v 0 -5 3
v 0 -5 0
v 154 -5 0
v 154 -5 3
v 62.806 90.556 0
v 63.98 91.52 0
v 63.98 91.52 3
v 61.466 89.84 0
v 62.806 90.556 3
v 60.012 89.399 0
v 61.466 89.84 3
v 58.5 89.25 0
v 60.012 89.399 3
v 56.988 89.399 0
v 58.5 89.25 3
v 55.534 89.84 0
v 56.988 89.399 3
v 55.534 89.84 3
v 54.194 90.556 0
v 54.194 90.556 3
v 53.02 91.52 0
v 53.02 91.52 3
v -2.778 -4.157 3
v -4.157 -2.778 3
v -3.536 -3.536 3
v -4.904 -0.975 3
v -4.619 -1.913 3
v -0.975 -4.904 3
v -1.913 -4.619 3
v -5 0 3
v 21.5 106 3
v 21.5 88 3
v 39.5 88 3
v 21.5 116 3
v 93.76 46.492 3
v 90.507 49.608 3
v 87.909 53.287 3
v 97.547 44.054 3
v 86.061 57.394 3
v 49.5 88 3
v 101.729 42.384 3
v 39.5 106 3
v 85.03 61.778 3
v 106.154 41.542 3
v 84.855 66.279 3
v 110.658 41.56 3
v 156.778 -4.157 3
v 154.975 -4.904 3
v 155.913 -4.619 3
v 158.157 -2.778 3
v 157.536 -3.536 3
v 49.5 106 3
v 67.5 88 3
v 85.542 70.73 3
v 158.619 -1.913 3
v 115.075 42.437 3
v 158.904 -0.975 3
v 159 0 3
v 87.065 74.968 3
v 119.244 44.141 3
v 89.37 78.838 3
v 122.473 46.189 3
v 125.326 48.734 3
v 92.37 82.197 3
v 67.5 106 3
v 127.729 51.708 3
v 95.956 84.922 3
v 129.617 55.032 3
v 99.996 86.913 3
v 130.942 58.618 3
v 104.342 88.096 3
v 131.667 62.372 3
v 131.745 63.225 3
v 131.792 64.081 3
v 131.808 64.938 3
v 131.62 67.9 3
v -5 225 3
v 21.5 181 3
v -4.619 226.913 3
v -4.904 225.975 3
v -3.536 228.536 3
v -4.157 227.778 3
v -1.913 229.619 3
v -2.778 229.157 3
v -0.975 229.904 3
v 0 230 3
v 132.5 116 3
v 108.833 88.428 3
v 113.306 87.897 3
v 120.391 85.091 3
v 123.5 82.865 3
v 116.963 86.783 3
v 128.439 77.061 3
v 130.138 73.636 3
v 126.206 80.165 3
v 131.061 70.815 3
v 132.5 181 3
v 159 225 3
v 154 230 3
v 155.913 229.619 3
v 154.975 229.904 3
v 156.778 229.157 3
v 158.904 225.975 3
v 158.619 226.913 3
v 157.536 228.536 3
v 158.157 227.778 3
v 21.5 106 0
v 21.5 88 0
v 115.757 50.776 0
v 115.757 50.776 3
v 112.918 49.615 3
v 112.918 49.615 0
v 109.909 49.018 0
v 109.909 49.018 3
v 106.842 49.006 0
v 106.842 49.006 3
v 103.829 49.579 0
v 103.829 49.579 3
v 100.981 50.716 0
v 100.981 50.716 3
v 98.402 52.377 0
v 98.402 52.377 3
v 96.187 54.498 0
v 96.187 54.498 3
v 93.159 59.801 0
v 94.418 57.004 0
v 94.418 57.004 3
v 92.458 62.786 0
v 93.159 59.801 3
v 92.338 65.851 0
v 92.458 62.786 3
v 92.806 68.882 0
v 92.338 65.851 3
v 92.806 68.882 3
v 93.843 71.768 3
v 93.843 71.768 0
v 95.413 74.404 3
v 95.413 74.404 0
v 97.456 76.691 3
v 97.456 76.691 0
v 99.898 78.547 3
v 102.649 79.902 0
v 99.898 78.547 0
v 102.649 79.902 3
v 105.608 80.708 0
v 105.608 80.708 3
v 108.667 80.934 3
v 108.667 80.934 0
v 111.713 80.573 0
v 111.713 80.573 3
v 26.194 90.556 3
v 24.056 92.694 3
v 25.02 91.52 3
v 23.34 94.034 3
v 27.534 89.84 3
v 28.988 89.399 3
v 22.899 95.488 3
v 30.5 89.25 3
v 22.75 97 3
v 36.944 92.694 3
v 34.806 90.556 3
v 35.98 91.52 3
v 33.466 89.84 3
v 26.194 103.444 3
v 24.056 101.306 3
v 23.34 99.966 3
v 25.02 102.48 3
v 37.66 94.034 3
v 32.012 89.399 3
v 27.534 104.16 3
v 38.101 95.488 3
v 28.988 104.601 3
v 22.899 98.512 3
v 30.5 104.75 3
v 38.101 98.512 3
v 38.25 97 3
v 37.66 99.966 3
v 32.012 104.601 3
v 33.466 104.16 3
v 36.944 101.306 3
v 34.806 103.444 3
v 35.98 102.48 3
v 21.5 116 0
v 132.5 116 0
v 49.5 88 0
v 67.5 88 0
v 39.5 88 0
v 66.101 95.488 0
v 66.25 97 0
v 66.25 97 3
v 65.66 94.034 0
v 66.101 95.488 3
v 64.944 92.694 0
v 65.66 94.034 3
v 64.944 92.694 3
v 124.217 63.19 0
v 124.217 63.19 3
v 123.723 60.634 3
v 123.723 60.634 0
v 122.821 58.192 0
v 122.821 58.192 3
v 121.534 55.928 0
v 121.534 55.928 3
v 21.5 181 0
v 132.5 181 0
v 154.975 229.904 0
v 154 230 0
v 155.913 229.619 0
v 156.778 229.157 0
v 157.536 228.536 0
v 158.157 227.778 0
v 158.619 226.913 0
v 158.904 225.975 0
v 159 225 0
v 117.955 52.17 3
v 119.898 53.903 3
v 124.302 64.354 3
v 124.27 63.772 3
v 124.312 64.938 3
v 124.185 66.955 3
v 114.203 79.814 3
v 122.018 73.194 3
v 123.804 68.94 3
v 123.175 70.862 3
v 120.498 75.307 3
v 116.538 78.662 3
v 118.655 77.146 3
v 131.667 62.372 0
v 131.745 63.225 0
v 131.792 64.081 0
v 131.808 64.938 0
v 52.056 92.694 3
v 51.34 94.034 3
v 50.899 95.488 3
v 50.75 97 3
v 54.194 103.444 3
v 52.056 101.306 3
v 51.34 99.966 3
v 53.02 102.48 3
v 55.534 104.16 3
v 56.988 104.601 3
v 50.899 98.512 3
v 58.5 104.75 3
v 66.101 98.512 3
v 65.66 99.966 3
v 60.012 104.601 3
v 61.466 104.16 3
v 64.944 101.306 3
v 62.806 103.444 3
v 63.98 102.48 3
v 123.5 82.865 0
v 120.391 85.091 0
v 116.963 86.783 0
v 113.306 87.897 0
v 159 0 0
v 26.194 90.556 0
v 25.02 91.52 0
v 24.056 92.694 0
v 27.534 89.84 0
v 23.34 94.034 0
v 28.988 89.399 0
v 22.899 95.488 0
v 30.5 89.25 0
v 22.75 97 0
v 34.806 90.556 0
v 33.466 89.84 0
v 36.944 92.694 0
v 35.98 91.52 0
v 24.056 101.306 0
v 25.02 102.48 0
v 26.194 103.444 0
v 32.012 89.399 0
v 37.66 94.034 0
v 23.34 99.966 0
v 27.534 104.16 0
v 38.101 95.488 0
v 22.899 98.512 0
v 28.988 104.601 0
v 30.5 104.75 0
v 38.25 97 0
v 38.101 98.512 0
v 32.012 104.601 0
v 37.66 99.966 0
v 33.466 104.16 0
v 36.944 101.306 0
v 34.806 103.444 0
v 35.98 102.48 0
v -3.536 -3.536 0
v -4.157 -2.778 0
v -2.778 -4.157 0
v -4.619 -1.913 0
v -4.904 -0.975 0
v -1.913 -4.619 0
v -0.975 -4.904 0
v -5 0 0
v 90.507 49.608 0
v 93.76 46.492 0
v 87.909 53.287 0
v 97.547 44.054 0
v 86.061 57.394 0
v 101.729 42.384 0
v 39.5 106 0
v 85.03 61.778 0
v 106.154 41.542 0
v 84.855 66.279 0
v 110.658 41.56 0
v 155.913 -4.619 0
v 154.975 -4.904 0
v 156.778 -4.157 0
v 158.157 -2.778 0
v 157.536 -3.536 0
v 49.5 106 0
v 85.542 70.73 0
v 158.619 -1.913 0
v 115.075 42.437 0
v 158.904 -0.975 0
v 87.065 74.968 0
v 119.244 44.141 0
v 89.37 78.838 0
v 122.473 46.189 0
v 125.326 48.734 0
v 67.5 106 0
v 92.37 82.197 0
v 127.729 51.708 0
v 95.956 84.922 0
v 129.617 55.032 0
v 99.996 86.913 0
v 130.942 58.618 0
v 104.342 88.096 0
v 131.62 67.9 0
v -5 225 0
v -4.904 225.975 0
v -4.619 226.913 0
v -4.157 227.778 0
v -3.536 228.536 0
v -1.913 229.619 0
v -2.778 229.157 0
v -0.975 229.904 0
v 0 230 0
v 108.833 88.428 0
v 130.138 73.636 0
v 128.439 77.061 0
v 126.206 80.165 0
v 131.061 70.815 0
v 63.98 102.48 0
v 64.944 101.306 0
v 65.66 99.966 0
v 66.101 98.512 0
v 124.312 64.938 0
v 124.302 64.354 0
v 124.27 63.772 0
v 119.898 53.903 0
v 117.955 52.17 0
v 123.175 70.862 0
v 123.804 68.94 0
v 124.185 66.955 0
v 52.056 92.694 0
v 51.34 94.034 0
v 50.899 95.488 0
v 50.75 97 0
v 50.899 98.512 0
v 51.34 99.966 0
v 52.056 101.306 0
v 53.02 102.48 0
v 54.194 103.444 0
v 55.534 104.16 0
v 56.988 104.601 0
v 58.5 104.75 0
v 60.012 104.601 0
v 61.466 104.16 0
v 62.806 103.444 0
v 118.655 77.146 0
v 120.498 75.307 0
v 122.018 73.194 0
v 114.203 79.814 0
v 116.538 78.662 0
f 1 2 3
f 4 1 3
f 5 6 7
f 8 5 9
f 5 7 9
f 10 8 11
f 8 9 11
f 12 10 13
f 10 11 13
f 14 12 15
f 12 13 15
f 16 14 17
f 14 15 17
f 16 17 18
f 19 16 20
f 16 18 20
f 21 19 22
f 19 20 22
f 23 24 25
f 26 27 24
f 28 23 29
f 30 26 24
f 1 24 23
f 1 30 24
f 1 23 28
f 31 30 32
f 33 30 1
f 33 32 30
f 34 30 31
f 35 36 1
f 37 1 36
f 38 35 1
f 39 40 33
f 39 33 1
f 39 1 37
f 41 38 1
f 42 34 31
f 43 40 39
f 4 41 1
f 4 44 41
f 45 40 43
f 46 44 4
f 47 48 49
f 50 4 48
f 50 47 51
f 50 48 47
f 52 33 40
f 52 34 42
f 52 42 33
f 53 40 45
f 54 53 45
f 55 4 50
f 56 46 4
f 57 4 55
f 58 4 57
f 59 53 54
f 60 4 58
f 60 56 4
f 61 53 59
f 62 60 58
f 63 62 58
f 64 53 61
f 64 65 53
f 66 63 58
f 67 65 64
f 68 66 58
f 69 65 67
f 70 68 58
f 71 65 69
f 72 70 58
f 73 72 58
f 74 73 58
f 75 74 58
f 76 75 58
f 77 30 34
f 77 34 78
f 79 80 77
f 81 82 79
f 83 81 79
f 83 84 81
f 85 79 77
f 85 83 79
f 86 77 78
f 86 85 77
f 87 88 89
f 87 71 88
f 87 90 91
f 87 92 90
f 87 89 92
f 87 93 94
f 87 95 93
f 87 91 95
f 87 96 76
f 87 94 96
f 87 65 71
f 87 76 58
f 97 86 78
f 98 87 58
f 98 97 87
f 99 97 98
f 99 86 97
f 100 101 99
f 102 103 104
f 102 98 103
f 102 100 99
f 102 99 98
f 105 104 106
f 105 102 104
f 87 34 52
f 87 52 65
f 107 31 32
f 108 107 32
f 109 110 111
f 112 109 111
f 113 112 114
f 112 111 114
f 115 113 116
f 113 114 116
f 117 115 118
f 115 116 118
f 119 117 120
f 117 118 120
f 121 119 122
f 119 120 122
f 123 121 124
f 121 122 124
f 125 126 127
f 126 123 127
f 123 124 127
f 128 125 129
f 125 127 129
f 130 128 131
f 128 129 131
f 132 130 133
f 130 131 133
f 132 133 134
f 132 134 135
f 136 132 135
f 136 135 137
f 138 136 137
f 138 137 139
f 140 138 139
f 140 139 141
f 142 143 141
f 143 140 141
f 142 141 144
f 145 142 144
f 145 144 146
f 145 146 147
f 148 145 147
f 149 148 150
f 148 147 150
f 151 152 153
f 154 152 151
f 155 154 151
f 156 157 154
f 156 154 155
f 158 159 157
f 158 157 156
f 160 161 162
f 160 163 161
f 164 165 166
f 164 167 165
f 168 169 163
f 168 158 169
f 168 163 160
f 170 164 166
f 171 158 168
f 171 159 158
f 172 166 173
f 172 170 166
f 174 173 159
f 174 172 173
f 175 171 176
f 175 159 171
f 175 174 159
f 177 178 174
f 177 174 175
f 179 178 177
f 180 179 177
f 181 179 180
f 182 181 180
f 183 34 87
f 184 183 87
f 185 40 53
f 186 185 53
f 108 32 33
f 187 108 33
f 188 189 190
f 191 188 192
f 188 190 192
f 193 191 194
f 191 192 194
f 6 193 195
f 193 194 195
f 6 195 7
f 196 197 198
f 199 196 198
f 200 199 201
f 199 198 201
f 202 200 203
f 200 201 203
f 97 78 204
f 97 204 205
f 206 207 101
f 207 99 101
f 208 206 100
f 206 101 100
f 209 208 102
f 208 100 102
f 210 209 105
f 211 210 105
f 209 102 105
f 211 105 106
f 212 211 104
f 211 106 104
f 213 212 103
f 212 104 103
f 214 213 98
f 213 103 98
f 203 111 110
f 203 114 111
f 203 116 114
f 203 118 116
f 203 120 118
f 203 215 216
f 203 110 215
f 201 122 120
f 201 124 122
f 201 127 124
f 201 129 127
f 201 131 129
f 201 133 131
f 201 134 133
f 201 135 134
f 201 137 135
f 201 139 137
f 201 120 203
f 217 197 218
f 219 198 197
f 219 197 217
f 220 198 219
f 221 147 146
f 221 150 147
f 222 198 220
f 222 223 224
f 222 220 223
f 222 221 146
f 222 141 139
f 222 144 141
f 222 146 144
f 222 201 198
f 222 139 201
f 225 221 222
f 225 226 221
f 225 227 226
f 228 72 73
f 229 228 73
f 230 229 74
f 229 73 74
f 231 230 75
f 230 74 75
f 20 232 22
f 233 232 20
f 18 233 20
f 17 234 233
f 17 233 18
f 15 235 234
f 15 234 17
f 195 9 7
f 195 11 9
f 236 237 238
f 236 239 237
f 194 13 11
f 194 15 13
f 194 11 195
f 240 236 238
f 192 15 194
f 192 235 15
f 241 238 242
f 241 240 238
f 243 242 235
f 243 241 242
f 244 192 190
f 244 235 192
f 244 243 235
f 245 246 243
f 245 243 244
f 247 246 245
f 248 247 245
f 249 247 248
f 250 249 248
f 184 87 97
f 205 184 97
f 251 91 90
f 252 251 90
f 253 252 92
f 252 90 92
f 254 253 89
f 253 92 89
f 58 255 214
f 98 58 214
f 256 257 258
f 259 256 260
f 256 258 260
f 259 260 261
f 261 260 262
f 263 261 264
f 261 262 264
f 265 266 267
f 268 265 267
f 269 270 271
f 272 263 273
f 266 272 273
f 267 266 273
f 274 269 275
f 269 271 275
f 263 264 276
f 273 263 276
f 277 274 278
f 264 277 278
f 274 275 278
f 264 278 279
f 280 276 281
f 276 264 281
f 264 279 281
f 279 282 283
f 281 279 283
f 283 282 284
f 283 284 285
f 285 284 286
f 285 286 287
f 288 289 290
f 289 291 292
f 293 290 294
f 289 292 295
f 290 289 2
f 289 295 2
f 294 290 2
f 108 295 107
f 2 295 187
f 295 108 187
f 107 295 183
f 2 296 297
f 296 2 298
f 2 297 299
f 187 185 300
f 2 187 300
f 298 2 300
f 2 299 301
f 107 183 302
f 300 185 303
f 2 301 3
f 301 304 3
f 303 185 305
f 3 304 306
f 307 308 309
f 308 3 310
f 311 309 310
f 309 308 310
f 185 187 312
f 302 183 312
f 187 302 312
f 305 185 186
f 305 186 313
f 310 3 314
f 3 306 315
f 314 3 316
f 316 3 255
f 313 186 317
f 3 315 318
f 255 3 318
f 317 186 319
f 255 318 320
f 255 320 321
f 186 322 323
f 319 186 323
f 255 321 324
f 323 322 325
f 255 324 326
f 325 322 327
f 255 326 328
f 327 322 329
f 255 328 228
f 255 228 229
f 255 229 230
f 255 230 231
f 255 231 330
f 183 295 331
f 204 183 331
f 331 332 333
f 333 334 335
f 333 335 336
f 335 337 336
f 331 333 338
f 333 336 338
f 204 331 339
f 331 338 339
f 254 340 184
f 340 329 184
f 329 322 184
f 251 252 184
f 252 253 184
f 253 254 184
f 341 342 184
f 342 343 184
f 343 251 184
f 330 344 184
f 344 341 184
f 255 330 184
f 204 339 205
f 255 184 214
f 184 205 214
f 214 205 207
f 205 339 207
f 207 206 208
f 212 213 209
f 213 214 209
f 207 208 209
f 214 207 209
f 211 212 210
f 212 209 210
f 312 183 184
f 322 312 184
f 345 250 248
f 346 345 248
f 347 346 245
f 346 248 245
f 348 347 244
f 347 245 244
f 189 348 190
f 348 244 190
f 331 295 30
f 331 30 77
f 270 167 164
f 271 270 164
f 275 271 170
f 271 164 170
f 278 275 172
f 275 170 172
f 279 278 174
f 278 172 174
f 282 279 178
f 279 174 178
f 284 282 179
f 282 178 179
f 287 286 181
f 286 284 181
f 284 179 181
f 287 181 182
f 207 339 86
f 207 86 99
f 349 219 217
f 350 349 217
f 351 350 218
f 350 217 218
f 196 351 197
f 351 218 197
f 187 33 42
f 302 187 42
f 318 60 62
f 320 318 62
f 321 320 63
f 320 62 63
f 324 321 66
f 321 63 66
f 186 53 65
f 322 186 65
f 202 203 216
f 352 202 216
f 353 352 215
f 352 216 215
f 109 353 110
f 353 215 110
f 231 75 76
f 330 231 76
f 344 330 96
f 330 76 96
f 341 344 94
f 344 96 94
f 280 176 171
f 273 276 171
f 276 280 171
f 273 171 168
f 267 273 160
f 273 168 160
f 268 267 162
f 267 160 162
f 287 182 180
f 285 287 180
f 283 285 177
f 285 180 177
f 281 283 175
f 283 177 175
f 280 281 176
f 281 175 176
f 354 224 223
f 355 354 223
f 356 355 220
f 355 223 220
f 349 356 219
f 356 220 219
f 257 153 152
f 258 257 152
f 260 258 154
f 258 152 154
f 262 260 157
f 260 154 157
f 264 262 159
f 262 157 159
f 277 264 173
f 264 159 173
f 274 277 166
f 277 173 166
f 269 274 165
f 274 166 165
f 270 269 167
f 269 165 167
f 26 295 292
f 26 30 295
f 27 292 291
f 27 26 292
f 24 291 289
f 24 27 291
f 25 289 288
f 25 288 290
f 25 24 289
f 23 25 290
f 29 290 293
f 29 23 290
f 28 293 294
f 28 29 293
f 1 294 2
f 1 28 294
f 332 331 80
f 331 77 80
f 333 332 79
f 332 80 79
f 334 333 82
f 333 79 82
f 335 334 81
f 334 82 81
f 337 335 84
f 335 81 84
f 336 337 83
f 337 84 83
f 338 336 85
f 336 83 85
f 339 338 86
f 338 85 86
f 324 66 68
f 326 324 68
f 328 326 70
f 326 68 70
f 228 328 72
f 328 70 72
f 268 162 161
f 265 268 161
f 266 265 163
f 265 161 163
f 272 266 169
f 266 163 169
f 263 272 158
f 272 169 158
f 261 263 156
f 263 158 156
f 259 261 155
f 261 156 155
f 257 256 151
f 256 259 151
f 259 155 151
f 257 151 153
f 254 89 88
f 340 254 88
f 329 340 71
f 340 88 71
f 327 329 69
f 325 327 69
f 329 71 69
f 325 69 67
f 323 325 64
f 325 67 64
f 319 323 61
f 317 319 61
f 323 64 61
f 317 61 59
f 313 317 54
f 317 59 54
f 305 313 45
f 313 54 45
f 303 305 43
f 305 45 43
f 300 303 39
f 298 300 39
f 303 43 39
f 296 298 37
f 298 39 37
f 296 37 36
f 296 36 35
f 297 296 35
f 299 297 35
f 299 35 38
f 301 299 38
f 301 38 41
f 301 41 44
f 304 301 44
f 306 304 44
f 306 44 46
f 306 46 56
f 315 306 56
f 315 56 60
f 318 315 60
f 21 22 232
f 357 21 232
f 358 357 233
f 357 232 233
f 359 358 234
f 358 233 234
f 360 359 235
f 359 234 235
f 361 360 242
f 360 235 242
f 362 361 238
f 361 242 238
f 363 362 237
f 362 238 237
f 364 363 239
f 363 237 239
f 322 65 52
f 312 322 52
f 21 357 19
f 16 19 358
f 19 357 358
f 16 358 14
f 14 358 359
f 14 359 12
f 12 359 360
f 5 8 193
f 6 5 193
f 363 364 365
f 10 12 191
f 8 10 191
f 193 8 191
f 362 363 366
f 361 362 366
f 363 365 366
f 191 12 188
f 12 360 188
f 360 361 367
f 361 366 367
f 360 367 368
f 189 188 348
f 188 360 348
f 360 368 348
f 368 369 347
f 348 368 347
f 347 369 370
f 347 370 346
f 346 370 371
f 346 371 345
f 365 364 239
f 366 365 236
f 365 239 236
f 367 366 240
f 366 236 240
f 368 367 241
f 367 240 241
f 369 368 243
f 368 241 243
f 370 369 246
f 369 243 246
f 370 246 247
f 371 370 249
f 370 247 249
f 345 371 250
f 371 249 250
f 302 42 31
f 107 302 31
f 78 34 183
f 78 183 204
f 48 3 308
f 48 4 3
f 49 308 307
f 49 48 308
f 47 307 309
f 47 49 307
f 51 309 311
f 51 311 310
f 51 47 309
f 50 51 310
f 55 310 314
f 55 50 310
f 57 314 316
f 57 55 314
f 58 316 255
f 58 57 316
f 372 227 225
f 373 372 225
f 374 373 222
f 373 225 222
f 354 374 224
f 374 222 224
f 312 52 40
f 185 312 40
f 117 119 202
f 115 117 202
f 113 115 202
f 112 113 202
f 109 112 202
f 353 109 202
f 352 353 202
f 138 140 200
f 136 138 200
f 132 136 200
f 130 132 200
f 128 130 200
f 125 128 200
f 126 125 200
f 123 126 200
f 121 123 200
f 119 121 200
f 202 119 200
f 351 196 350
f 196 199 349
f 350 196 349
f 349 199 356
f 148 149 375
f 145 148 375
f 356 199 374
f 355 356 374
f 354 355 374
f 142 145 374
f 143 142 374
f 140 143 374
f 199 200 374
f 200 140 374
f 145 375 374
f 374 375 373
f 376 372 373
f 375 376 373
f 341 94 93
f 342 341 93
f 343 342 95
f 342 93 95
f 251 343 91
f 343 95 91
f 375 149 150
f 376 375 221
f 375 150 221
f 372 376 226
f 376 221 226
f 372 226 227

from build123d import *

# Parameters (mm, degrees)
F0_W     = 164
F0_H     = 235
F0_W_2   = 103
F0_H_2   = 57
F1_DEPTH = 3
F2_R     = 5
F3_W     = 111
F3_H     = 65
F4_DEPTH = 3.001


with BuildPart() as f1:
    # F0 (on Top) → F1 (new body)
    with BuildSketch(Plane.XY):
        with Locations((77, 112.5)):
            Rectangle(F0_W, F0_H)
        with Locations((77, 148.5)):
            Rectangle(F0_W_2, F0_H_2, mode=Mode.SUBTRACT)
    extrude(amount=F1_DEPTH)

    # F2
    f2_edges = [f1.edges().sort_by_distance(p)[0] for p in [
        (-5, 230, 1.5),
        (159, 230, 1.5),
        (159, -5, 1.5),
        (-5, -5, 1.5),
    ]]
    fillet(f2_edges, radius=F2_R)

    # F3 (on face) → F4 (cut, through all)
    with BuildSketch(Plane.XY.offset(3)):
        with BuildLine():
            ThreePointArc((35.980078, 102.480078), (37.660066, 99.965797), (38.25, 97))
            ThreePointArc((38.25, 97), (37.660066, 94.034203), (35.980078, 91.519922))
            Line((35.980078, 91.519922), (39.5, 88))
            Line((39.5, 88), (39.5, 106))
            Line((39.5, 106), (35.980078, 102.480078))
        make_face()
        with BuildLine():
            ThreePointArc((25.019922, 102.480078), (30.5, 104.75), (35.980078, 102.480078))
            Line((35.980078, 102.480078), (39.5, 106))
            Line((39.5, 106), (21.5, 106))
            Line((21.5, 106), (25.019922, 102.480078))
        make_face()
        with BuildLine():
            Line((39.5, 88), (35.980078, 91.519922))
            ThreePointArc((35.980078, 91.519922), (30.5, 89.25), (25.019922, 91.519922))
            Line((25.019922, 91.519922), (21.5, 88))
            Line((21.5, 88), (39.5, 88))
        make_face()
        with BuildLine():
            ThreePointArc((25.019922, 91.519922), (22.75, 97), (25.019922, 102.480078))
            Line((25.019922, 102.480078), (21.5, 106))
            Line((21.5, 106), (21.5, 88))
            Line((21.5, 88), (25.019922, 91.519922))
        make_face()
        with BuildLine():
            Line((49.5, 106), (49.5, 88))
            Line((49.5, 88), (53.019922, 91.519922))
            ThreePointArc((53.019922, 91.519922), (50.75, 97), (53.019922, 102.480078))
            Line((53.019922, 102.480078), (49.5, 106))
        make_face()
        with BuildLine():
            Line((53.019922, 91.519922), (49.5, 88))
            Line((49.5, 88), (67.5, 88))
            Line((67.5, 88), (63.980078, 91.519922))
            ThreePointArc((63.980078, 91.519922), (58.5, 89.25), (53.019922, 91.519922))
        make_face()
        with BuildLine():
            Line((63.980078, 91.519922), (67.5, 88))
            Line((67.5, 88), (67.5, 106))
            Line((67.5, 106), (63.980078, 102.480078))
            ThreePointArc((63.980078, 102.480078), (65.660066, 99.965797), (66.25, 97))
            ThreePointArc((66.25, 97), (65.660066, 94.034203), (63.980078, 91.519922))
        make_face()
        with BuildLine():
            Line((67.5, 106), (49.5, 106))
            Line((49.5, 106), (53.019922, 102.480078))
            ThreePointArc((53.019922, 102.480078), (58.5, 104.75), (63.980078, 102.480078))
            Line((63.980078, 102.480078), (67.5, 106))
        make_face()
        with Locations((77, 148.5)):
            Rectangle(F3_W, F3_H)
        with BuildLine():
            Line((130.138236, 73.636492), (123.175361, 70.861539))
            ThreePointArc((123.175361, 70.861539), (124.02545, 67.953854), (124.31224, 64.938057))
            ThreePointArc((124.31224, 64.938057), (124.288288, 64.062903), (124.216503, 63.190368))
            Line((124.216503, 63.190368), (131.667118, 62.371634))
            ThreePointArc((131.667118, 62.371634), (131.772532, 63.652922), (131.807705, 64.938057))
            ThreePointArc((131.807705, 64.938057), (131.386563, 69.366654), (130.138236, 73.636492))
        make_face()
        with BuildLine():
            ThreePointArc((118.654691, 77.145994), (121.300843, 74.2813), (123.175361, 70.861539))
            Line((123.175361, 70.861539), (130.138236, 73.636492))
            ThreePointArc((130.138236, 73.636492), (127.385569, 78.658297), (123.499783, 82.865004))
            Line((123.499783, 82.865004), (118.654691, 77.145994))
        make_face()
        with BuildLine():
            Line((131.667118, 62.371634), (124.216503, 63.190368))
            ThreePointArc((124.216503, 63.190368), (123.321274, 59.394693), (121.53438, 55.92834))
            Line((121.53438, 55.92834), (127.728511, 51.707589))
            ThreePointArc((127.728511, 51.707589), (130.352505, 56.797812), (131.667118, 62.371634))
        make_face()
        with BuildLine():
            ThreePointArc((111.712803, 80.572512), (115.394109, 79.285431), (118.654691, 77.145994))
            Line((118.654691, 77.145994), (123.499783, 82.865004))
            ThreePointArc((123.499783, 82.865004), (118.711727, 86.006696), (113.305853, 87.896731))
            Line((113.305853, 87.896731), (111.712803, 80.572512))
        make_face()
        with BuildLine():
            Line((127.728511, 51.707589), (121.53438, 55.92834))
            ThreePointArc((121.53438, 55.92834), (118.961979, 52.997242), (115.756891, 50.77553))
            Line((115.756891, 50.77553), (119.244461, 44.14086))
            ThreePointArc((119.244461, 44.14086), (123.951025, 47.403369), (127.728511, 51.707589))
        make_face()
        with BuildLine():
            ThreePointArc((115.756891, 50.77553), (92.457597, 62.786243), (111.712803, 80.572512))
            Line((111.712803, 80.572512), (113.305853, 87.896731))
            ThreePointArc((113.305853, 87.896731), (85.030227, 61.778189), (119.244461, 44.14086))
            Line((119.244461, 44.14086), (115.756891, 50.77553))
        make_face()
    extrude(amount=-F4_DEPTH, mode=Mode.SUBTRACT)


solid = f1.part
